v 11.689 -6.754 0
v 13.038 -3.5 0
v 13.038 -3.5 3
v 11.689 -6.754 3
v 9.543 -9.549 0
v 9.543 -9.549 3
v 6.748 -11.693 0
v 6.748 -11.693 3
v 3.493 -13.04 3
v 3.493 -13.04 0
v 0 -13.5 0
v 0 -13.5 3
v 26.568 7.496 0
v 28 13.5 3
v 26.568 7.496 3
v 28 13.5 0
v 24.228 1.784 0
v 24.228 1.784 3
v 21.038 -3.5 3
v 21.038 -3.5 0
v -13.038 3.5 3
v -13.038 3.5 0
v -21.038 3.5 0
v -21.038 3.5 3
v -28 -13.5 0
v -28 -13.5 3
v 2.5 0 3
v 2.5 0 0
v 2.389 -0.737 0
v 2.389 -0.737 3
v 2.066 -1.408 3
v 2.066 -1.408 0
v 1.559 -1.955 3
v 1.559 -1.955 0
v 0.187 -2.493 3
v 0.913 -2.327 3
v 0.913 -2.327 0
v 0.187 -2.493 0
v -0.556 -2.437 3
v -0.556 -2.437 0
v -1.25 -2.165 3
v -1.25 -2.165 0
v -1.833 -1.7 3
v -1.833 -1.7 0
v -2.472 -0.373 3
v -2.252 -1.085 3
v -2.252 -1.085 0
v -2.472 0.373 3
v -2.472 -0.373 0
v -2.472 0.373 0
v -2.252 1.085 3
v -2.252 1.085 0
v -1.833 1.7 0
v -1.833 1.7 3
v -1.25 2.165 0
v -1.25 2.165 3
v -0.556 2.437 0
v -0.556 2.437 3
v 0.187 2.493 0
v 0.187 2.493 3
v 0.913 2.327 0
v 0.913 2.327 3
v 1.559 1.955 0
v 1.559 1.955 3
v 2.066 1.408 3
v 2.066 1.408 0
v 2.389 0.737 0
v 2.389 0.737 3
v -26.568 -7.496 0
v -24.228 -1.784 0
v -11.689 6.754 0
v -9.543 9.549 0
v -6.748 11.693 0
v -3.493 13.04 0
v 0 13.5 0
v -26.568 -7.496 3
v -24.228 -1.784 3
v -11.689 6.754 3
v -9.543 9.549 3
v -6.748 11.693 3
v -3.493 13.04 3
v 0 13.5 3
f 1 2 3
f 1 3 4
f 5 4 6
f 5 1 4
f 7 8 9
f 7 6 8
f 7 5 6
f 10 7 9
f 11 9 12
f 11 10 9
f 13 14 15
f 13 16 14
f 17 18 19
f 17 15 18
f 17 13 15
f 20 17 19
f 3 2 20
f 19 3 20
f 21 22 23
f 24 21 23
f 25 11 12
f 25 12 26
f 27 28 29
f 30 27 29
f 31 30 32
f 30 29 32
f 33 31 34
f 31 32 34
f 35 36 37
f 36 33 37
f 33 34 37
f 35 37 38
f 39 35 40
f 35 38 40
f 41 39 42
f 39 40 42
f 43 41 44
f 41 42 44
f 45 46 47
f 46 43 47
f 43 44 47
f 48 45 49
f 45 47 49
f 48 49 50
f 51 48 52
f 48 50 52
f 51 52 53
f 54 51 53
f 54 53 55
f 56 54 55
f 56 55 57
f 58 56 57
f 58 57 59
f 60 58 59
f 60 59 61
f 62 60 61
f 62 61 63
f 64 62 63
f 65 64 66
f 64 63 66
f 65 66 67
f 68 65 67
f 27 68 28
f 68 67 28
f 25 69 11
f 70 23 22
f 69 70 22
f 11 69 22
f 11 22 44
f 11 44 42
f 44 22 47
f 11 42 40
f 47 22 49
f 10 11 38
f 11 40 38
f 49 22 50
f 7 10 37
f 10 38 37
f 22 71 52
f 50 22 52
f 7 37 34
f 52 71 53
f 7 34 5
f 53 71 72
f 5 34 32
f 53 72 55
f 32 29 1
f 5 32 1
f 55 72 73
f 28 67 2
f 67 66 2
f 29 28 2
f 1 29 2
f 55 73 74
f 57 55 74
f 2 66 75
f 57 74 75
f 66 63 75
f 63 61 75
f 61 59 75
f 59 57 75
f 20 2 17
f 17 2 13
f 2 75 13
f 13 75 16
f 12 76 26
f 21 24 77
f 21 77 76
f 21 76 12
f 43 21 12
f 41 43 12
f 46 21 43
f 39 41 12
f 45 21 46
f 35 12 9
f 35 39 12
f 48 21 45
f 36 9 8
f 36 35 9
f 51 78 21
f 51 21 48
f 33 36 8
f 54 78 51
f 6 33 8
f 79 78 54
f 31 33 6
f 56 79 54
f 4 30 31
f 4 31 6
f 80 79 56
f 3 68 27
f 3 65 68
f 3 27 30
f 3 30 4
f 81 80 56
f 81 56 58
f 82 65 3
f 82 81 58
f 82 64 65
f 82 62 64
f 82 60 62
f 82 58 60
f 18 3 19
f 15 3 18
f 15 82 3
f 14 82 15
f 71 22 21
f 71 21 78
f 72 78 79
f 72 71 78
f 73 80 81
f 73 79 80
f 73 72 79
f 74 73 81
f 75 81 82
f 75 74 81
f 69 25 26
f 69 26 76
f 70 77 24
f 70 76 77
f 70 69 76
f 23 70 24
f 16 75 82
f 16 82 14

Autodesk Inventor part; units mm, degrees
ref_plane "YZ Plane" through (0, 0, 0) normal (1, 0, 0) x (0, 1, 0)
ref_plane "XZ Plane" through (0, 0, 0) normal (0, 1, 0) x (-1, 0, 0)
ref_plane "XY Plane" through (0, 0, 0) normal (0, 0, 1) x (1, 0, 0)
sketch "Sketch3" plane through (0, 0, 0) normal (0, 0, 1) x (1, 0, 0)
  line L0 (13.0384, -3.5) -> (21.0384, -3.5)
  line L1 (-13.0384, 3.5) -> (-21.0384, 3.5)
  line L2 (0, 13.5) -> (28, 13.5)
  line L3 (0, -13.5) -> (-28, -13.5)
  arc A0 (-21.0384, 3.5) -> (-28, -13.5) centre (11.5082, -19.7534) ccw
  arc A1 (21.0384, -3.5) -> (28, 13.5) centre (-11.5082, 19.7534) ccw
  arc A2 (0, 13.5) -> (-13.0384, 3.5) centre (0, 0) ccw
  arc A3 (0, -13.5) -> (13.0384, -3.5) centre (0, 0) ccw
  circle A4 centre (0, 0) radius 2.5
  dimension "d29" = 8
  dimension "d30" = 8
  dimension "d33" = 28
  dimension "d34" = 28
  dimension "d35" = 40
  dimension "d36" = 40
  dimension "d37" = 5
extrude "Extrusion2" add sketch "Sketch3" along normal blind 3
properties part number "ArmaPrime"
